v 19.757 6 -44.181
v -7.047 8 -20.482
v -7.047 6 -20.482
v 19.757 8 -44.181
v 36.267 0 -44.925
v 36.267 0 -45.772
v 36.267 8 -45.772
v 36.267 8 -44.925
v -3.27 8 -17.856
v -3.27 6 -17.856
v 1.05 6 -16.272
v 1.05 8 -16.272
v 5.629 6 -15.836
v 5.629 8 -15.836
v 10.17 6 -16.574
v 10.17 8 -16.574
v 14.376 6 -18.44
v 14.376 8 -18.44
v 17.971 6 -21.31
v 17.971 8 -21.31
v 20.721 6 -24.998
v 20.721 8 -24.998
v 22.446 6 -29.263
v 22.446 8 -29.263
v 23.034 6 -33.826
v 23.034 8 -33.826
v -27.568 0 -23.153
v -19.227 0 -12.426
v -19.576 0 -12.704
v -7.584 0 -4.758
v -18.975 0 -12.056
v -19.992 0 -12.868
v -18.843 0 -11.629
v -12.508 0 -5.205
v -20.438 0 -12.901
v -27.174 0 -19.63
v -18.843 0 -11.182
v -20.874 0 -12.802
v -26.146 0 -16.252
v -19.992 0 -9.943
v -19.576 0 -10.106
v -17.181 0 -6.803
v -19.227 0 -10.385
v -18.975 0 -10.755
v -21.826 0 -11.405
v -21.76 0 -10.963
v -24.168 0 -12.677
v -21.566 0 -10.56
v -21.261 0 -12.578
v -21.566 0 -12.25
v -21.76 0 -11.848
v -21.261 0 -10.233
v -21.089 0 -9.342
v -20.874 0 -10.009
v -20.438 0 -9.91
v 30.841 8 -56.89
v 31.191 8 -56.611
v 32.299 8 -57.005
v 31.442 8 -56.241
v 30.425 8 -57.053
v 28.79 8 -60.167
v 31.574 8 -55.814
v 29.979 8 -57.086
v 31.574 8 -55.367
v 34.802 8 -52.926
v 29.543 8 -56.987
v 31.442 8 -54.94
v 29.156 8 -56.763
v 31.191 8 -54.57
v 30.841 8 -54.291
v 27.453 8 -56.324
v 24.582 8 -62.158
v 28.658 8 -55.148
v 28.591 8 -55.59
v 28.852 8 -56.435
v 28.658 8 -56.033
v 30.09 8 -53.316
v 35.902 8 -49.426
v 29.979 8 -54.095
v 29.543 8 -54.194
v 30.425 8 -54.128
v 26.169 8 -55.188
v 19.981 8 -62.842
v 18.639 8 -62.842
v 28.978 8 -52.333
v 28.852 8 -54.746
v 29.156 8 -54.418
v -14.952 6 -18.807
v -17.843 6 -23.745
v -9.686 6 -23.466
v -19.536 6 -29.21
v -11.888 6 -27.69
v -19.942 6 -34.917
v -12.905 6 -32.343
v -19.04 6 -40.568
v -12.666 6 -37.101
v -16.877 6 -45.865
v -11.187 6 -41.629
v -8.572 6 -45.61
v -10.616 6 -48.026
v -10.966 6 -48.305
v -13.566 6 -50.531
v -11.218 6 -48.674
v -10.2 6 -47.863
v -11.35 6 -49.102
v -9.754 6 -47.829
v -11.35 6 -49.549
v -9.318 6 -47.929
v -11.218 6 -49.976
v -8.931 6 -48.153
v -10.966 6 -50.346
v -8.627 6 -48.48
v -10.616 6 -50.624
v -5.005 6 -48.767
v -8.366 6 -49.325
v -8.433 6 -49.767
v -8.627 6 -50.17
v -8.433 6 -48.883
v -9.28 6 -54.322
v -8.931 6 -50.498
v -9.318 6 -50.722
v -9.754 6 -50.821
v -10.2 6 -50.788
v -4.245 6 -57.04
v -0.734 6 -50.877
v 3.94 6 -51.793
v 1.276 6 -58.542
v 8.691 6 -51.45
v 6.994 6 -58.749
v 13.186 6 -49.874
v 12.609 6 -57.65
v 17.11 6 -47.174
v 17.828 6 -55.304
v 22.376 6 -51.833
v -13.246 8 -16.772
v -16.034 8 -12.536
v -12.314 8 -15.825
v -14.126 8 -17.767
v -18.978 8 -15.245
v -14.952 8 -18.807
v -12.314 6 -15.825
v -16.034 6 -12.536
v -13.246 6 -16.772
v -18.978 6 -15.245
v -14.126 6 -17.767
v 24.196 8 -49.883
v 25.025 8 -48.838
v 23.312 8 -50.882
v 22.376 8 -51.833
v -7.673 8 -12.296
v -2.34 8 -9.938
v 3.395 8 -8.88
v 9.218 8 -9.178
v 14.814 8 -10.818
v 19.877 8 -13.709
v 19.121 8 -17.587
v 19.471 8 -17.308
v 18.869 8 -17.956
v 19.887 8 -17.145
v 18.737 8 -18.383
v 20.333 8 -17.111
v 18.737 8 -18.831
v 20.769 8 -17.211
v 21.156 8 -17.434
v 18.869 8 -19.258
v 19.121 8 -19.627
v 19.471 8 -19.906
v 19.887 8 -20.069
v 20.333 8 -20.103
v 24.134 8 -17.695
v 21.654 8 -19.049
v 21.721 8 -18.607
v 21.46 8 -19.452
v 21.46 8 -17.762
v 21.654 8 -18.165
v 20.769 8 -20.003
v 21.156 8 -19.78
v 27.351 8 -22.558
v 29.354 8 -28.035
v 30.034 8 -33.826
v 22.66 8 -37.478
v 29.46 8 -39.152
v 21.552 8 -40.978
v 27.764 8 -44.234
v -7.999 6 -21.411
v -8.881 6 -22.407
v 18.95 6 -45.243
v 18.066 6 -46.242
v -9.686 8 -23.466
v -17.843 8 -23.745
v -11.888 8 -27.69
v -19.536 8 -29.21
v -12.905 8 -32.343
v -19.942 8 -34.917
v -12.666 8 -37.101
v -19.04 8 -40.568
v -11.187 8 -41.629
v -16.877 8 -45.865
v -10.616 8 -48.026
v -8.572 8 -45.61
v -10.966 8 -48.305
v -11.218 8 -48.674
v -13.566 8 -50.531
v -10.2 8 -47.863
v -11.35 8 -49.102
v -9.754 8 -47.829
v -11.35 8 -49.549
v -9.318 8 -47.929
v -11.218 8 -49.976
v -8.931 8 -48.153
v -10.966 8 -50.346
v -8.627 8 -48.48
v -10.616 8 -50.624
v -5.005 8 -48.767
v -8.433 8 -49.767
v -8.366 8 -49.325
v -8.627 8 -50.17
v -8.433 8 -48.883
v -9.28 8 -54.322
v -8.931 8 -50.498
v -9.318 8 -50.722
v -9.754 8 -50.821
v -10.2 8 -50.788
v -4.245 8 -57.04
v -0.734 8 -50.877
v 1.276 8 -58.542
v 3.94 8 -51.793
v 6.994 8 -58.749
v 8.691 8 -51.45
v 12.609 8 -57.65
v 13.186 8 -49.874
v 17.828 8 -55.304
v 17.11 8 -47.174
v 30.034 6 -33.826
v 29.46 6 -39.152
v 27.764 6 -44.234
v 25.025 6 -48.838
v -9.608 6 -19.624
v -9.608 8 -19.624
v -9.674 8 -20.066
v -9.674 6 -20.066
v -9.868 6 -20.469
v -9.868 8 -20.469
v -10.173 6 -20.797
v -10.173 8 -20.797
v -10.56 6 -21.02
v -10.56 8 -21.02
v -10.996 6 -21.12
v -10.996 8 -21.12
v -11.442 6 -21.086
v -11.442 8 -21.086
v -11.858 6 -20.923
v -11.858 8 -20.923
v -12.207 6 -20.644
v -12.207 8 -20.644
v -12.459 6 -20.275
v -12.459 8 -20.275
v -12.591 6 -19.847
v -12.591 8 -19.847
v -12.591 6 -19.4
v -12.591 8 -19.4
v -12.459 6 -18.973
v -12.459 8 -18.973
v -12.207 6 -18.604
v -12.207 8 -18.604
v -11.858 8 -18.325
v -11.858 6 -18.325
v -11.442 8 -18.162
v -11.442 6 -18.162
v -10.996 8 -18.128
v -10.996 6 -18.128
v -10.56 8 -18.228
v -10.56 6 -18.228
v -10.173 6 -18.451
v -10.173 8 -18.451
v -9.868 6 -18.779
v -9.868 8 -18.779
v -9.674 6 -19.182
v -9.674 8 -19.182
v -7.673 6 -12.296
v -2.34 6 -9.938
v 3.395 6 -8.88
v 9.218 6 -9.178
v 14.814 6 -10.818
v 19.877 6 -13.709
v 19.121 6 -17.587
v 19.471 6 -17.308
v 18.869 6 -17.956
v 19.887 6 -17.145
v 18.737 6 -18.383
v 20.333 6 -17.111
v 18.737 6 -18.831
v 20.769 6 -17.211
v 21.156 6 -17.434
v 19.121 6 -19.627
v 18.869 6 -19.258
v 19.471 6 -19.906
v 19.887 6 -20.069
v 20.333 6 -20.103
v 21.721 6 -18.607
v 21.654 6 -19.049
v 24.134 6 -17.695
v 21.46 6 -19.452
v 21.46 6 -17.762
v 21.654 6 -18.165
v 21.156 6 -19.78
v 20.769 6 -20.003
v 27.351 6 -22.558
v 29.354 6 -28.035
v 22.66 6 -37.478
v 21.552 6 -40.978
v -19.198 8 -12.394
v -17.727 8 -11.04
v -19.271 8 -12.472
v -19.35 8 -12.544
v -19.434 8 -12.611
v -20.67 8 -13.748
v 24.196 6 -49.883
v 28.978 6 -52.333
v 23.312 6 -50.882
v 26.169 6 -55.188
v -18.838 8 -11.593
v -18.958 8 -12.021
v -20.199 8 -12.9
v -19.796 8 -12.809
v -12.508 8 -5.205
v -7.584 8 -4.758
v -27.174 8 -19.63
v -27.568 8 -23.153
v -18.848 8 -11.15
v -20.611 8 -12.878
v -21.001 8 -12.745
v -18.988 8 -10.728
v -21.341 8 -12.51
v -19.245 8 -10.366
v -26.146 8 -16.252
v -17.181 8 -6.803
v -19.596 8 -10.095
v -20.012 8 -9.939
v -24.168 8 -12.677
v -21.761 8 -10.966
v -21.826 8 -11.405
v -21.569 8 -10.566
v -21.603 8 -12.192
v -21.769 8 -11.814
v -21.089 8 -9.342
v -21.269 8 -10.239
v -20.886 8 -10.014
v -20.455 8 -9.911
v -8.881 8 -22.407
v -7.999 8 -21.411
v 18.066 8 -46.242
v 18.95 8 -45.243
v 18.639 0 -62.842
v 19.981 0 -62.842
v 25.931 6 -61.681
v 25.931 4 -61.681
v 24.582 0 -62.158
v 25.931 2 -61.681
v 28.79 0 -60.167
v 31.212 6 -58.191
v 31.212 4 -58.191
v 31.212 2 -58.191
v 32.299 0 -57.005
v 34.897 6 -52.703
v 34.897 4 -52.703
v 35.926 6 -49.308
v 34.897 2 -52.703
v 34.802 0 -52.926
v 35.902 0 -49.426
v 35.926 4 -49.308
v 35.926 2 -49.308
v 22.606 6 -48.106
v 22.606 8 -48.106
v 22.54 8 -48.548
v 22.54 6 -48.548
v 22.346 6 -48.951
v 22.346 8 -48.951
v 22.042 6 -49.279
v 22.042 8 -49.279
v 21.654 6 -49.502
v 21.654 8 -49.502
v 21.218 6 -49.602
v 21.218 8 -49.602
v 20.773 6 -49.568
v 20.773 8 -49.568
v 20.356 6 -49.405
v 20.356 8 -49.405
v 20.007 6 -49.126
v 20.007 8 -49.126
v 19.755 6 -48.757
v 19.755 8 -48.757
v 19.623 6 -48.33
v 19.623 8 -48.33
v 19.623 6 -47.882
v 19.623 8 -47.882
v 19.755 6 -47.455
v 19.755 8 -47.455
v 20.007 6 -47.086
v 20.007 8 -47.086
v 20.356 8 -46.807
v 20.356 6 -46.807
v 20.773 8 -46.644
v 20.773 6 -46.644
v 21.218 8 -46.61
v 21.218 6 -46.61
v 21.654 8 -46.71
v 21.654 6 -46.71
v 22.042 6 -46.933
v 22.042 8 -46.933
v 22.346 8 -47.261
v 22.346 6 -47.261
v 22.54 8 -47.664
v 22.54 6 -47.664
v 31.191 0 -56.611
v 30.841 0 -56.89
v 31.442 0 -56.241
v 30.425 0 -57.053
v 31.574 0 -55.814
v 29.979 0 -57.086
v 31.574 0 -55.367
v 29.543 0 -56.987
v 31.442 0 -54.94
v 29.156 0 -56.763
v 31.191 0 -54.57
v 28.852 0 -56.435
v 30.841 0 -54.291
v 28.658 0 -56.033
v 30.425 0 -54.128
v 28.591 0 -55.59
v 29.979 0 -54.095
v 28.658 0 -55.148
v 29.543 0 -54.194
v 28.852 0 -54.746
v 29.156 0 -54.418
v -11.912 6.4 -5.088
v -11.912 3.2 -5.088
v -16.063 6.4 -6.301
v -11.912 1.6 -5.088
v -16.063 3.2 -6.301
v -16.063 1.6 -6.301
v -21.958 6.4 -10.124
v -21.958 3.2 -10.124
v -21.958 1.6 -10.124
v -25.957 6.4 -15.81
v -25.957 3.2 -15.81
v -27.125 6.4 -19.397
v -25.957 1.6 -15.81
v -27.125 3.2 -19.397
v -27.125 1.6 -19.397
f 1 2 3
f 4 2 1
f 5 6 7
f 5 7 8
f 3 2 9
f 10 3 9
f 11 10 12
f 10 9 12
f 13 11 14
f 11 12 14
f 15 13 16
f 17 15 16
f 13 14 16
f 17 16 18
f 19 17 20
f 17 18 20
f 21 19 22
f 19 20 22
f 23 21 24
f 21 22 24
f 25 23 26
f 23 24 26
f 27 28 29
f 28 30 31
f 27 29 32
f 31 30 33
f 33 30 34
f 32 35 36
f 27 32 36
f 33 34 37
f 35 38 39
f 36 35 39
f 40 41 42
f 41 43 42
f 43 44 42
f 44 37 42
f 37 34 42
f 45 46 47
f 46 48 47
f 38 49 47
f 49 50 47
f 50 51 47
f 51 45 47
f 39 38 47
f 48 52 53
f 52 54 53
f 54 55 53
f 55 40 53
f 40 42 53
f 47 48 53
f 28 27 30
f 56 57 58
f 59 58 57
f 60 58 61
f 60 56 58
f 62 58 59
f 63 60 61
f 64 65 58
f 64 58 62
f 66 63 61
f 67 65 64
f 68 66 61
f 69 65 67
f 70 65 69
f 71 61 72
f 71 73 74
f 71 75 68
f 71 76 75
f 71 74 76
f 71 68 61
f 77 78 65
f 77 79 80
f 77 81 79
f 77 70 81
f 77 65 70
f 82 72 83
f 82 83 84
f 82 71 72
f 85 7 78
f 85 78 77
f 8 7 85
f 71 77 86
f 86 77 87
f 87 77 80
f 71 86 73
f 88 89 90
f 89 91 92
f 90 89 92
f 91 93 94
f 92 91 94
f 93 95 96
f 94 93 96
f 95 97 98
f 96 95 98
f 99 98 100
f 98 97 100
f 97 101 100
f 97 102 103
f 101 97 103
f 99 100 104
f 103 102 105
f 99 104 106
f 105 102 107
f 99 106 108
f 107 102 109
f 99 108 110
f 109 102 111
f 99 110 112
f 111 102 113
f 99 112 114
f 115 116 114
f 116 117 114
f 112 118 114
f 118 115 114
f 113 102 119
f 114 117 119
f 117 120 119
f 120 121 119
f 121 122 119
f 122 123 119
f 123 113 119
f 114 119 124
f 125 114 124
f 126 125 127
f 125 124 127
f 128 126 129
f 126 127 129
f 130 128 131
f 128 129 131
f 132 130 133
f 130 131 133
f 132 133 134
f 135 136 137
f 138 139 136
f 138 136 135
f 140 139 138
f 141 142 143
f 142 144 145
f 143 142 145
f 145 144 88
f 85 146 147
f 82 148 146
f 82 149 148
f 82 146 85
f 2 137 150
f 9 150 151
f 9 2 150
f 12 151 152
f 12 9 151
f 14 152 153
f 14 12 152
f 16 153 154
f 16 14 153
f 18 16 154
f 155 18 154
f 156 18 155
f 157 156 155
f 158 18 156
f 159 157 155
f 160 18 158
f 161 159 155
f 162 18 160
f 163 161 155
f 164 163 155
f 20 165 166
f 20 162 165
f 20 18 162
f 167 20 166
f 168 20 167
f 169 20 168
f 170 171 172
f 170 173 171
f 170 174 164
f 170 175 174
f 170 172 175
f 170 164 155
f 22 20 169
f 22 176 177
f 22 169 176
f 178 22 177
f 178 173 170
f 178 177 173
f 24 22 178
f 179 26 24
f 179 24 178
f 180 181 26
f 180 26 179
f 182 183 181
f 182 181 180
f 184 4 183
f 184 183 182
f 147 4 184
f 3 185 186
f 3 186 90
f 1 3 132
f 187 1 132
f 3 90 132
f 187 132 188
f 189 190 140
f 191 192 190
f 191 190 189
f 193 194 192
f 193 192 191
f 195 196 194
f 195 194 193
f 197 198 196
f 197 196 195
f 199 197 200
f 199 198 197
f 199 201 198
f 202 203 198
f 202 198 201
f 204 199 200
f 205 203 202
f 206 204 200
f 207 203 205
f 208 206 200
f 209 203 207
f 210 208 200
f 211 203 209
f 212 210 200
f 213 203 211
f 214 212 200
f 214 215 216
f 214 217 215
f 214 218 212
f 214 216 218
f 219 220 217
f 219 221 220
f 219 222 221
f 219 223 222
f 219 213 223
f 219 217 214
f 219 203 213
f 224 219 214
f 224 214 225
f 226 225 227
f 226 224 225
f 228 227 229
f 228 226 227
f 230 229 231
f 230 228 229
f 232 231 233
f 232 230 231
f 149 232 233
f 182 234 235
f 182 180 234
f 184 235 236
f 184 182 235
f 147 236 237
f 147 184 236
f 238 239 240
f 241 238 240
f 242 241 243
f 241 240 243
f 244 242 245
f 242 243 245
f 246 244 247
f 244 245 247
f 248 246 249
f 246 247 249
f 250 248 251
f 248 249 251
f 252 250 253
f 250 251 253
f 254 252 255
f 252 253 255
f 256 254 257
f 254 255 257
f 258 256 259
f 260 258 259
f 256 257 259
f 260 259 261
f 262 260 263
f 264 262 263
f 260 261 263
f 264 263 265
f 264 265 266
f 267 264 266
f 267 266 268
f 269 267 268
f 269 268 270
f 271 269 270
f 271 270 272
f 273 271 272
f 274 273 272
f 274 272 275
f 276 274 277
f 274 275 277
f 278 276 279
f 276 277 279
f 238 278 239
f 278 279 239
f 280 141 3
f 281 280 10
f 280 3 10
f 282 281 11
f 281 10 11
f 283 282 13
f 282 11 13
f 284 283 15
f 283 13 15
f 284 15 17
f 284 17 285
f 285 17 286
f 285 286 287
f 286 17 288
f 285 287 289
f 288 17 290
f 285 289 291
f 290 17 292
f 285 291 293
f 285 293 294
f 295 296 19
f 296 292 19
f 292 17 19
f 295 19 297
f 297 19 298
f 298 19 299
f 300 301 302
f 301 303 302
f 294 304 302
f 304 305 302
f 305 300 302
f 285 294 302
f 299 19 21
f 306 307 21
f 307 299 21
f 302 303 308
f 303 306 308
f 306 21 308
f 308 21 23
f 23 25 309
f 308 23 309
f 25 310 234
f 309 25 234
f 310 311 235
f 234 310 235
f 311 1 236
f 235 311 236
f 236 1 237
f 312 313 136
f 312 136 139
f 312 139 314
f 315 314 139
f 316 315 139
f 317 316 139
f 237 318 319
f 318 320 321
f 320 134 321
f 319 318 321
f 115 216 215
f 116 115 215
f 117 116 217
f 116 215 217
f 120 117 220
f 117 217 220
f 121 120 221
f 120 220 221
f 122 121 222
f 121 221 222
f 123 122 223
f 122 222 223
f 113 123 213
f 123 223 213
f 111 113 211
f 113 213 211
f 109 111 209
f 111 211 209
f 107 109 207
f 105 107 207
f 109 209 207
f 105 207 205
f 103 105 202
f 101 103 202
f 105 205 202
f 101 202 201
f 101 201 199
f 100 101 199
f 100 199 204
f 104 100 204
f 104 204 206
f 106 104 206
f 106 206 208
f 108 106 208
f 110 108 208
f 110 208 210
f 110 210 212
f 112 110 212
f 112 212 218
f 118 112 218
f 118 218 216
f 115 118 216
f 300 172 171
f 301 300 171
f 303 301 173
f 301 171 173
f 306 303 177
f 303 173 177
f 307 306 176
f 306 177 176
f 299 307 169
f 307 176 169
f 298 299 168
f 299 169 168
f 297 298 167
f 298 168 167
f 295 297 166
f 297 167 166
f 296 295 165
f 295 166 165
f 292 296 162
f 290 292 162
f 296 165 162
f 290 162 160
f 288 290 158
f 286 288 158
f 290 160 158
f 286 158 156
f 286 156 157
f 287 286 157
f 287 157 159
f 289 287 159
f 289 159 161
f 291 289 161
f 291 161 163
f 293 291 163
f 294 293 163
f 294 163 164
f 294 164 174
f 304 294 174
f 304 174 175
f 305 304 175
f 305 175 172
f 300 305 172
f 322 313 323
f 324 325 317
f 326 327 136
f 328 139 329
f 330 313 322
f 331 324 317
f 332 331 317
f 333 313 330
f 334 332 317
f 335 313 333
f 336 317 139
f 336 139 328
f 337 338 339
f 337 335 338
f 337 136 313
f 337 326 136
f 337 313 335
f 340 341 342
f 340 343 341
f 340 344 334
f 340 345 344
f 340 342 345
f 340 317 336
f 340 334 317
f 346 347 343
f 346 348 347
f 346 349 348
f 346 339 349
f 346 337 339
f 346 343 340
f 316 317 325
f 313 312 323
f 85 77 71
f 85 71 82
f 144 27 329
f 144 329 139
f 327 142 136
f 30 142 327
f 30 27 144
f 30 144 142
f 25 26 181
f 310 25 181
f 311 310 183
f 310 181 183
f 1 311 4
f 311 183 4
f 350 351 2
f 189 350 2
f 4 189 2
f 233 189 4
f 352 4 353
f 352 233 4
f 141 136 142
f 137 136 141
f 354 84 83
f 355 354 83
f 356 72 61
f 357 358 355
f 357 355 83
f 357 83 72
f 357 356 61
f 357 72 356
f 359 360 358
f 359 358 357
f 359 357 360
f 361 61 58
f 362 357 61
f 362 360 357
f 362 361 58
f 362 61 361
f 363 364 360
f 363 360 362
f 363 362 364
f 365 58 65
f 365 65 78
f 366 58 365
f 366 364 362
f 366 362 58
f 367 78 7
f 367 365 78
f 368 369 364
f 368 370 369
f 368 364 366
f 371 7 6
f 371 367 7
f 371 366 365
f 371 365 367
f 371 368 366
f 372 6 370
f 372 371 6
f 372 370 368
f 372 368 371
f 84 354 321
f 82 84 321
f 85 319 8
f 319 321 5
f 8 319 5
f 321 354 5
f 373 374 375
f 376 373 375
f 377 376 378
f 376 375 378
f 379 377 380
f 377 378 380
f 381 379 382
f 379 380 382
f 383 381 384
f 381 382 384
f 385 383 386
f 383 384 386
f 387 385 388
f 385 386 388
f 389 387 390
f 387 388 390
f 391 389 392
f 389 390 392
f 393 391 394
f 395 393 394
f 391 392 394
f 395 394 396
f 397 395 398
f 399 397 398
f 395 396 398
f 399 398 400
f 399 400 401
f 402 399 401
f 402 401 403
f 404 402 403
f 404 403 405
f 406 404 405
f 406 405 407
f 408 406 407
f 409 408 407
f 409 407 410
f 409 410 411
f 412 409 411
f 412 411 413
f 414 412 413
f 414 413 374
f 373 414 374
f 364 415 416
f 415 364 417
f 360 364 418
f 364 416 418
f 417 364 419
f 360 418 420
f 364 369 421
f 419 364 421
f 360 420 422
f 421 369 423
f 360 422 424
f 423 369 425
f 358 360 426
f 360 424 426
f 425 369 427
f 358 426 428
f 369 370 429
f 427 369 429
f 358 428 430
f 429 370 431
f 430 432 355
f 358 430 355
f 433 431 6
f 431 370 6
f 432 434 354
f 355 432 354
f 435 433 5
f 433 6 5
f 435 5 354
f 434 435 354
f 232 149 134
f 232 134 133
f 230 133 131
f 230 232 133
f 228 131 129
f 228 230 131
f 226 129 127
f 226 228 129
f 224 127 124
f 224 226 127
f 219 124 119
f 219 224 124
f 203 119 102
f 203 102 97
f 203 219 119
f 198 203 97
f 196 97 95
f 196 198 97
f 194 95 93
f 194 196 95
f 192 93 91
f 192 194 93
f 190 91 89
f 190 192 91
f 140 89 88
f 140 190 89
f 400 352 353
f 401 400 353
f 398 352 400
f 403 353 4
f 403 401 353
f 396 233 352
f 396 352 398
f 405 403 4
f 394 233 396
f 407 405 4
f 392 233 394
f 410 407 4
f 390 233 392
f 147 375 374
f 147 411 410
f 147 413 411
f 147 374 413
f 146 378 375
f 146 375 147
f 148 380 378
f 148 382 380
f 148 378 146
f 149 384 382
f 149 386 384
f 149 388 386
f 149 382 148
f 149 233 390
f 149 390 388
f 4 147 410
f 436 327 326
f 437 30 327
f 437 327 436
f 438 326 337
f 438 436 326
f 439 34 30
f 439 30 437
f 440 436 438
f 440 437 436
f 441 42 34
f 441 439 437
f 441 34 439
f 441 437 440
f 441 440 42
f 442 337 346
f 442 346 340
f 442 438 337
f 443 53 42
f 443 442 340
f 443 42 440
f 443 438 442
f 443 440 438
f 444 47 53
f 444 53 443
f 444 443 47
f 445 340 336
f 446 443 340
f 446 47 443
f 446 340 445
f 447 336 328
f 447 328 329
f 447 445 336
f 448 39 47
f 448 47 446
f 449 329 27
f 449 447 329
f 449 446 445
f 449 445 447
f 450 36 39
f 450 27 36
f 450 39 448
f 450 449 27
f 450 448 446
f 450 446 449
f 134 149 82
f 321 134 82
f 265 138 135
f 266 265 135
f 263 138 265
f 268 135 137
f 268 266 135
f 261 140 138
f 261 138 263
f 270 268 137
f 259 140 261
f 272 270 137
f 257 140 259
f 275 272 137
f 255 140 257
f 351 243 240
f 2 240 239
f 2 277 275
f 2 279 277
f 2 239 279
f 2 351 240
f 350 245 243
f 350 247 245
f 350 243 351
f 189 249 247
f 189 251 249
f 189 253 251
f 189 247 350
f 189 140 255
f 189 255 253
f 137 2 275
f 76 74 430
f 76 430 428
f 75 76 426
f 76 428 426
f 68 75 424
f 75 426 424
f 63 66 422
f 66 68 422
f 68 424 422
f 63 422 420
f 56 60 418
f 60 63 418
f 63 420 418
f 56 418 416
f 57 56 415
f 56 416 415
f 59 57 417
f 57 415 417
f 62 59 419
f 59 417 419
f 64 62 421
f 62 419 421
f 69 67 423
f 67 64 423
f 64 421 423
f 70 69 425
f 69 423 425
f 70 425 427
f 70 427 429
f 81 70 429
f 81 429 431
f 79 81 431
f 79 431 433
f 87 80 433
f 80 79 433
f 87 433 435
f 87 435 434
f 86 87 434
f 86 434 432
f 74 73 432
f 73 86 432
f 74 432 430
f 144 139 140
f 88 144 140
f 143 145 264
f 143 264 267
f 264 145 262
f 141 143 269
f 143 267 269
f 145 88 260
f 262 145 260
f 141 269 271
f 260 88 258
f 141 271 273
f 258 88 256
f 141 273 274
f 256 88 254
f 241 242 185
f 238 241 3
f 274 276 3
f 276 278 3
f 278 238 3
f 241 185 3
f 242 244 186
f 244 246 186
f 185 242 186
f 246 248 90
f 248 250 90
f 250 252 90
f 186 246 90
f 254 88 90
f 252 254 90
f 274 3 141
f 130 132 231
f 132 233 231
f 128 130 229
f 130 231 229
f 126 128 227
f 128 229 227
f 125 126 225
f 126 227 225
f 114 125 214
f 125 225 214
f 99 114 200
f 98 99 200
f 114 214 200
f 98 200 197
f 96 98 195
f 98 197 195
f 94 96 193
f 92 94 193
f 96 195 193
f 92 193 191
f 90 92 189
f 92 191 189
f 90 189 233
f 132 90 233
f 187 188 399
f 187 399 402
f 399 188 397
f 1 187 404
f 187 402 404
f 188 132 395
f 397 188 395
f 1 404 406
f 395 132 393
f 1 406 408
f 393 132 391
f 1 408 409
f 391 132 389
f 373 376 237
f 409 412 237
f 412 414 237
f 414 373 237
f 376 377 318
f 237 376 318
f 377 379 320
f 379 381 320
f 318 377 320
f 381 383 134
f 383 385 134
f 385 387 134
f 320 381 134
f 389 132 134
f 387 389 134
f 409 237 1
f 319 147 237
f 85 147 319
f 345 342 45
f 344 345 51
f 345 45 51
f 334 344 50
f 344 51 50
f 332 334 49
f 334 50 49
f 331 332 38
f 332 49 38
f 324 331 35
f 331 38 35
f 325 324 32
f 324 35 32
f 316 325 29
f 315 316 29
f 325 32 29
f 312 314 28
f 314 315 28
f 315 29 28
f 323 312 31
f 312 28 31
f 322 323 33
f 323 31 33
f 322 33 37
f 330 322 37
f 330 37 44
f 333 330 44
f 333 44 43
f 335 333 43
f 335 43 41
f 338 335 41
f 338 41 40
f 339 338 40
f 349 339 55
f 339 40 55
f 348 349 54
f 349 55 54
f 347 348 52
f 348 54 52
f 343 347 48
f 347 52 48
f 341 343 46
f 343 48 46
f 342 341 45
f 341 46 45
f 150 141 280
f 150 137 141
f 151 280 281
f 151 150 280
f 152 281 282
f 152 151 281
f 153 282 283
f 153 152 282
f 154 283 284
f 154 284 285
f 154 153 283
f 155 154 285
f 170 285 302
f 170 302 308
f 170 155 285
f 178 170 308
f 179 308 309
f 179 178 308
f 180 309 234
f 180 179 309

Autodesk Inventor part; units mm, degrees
ref_plane "YZ Plane" through (0, 0, 0) normal (1, 0, 0) x (0, 1, 0)
ref_plane "XZ Plane" through (0, 0, 0) normal (0, 1, 0) x (-1, 0, 0)
ref_plane "XY Plane" through (0, 0, 0) normal (0, 0, 1) x (1, 0, 0)
sketch "Sketch1" plane through (0, 0, 0) normal (0, 1, 0) x (-1, 0, 0)
  line L0 (27.5685, -23.1529) -> (7.584, -4.7581)
  line L1 (27.5685, -23.1529) -> (7.584, -4.7581)
  spline S0 degree 3 poles (7.584, -4.7581) (9.0341, -4.7222) (10.4847, -4.8305) (13.3346, -5.3449) (14.7272, -5.7489) (18.2487, -7.2033) (20.2523, -8.489) (23.6504, -11.7447) (25.0047, -13.6664) (26.9871, -18.1293) (27.5054, -20.6082) (27.5685, -23.1529) knots -2.481768 -2.481768 -2.481768 -2.481768 -2.126999 -2.126999 -1.773298 -1.773298 -1.19466 -1.19466 -0.620796 -0.620796 0 0 0 0
  circle A0 centre (20.3262, -11.4054) radius 1.5
  line L2 (-36.2673, -45.7716) -> (-36.2673, -44.9248)
  spline S1 degree 3 poles (-19.9806, -62.8419) (-22.0219, -62.8419) (-24.0395, -62.4476) (-27.9058, -60.8796) (-29.6966, -59.6913) (-32.7933, -56.6261) (-34.0383, -54.7586) (-35.8128, -50.509) (-36.2673, -48.1535) (-36.2673, -45.7716) knots -2.639853 -2.639853 -2.639853 -2.639853 -2.025479 -2.025479 -1.383917 -1.383917 -0.714589 -0.714589 0 0 0 0
  line L3 (-18.6392, -62.8419) -> (-19.9806, -62.8419)
  line L4 (-18.6392, -62.8419) -> (-36.2673, -44.9248)
  circle A1 centre (-30.091, -55.5905) radius 1.5
  point P0 (0, 0)
  point P1 (4.2097, 0)
extrude "Extrusion1" add sketch "Sketch1" along normal blind 8
sketch "Sketch2" plane through (0, 8, 0) normal (0, 1, 0) x (1, 0, 0)
  circle A0 centre (-20.3262, 11.4054) radius 1.5 projected
  circle A1 centre (30.091, 55.5905) radius 1.5 projected
  line L0 (-19.1981, 12.3941) -> (-17.7266, 11.0396)
  line L1 (-7.584, 4.7581) -> (-27.5685, 23.1529) projected
  line L2 (-17.7266, 11.0396) -> (-20.6696, 13.7485)
  line L3 (-20.6696, 13.7485) -> (27.4533, 56.3244)
  line L4 (27.4533, 56.3244) -> (30.0896, 53.3162)
  line L5 (-17.7266, 11.0396) -> (30.0896, 53.3162)
  point P0 (0, 0)
  dimension "d2" = 2
  dimension "d3" = 4
  dimension "d4" = 4
extrude "Extrusion2" add sketch "Sketch2" against normal blind 2 contours L2 A0 | A0 L2 L3 L1 L5 L0 | L1 L3 L4 L5 picked at (-19.3013, 12.4925)
sketch "Sketch3" plane through (0, 8, 0) normal (0, 1, 0) x (1, 0, 0)
  circle A0 centre (5.0339, 33.8258) radius 25
  circle A1 centre (5.0339, 33.8258) radius 18
  circle A2 centre (-11.1078, 19.6239) radius 1.5
  circle A3 centre (-9.8663, 49.3253) radius 1.5
  circle A4 centre (20.2206, 18.607) radius 1.5
  circle A5 centre (21.1064, 48.106) radius 1.5
  point P0 (0, 0)
  dimension "d9" = 3
  dimension "d10" = 3
  dimension "d11" = 3
  dimension "d12" = 3
extrude "Extrusion3" add sketch "Sketch3" against normal blind 2
sketch "Sketch4" plane through (0, 8, 0) normal (0, 1, 0) x (1, 0, 0)
  circle A0 centre (5.0339, 33.8258) radius 25
  circle A1 centre (5.0339, 33.8258) radius 18
  circle A2 centre (-11.1078, 19.6239) radius 1.5
  circle A3 centre (-9.8663, 49.3253) radius 1.5
  circle A4 centre (20.2206, 18.607) radius 1.5
  circle A5 centre (21.1064, 48.106) radius 1.5
  point P0 (0, 0)
  point P1 (0, 0)
  dimension "d15" = 3
  dimension "d16" = 3
  dimension "d17" = 3
  dimension "d18" = 3
extrude "Extrusion4" cut sketch "Sketch4" against normal blind 2 contours A2 | A5
properties part number "SoporteAnilloRGB"
